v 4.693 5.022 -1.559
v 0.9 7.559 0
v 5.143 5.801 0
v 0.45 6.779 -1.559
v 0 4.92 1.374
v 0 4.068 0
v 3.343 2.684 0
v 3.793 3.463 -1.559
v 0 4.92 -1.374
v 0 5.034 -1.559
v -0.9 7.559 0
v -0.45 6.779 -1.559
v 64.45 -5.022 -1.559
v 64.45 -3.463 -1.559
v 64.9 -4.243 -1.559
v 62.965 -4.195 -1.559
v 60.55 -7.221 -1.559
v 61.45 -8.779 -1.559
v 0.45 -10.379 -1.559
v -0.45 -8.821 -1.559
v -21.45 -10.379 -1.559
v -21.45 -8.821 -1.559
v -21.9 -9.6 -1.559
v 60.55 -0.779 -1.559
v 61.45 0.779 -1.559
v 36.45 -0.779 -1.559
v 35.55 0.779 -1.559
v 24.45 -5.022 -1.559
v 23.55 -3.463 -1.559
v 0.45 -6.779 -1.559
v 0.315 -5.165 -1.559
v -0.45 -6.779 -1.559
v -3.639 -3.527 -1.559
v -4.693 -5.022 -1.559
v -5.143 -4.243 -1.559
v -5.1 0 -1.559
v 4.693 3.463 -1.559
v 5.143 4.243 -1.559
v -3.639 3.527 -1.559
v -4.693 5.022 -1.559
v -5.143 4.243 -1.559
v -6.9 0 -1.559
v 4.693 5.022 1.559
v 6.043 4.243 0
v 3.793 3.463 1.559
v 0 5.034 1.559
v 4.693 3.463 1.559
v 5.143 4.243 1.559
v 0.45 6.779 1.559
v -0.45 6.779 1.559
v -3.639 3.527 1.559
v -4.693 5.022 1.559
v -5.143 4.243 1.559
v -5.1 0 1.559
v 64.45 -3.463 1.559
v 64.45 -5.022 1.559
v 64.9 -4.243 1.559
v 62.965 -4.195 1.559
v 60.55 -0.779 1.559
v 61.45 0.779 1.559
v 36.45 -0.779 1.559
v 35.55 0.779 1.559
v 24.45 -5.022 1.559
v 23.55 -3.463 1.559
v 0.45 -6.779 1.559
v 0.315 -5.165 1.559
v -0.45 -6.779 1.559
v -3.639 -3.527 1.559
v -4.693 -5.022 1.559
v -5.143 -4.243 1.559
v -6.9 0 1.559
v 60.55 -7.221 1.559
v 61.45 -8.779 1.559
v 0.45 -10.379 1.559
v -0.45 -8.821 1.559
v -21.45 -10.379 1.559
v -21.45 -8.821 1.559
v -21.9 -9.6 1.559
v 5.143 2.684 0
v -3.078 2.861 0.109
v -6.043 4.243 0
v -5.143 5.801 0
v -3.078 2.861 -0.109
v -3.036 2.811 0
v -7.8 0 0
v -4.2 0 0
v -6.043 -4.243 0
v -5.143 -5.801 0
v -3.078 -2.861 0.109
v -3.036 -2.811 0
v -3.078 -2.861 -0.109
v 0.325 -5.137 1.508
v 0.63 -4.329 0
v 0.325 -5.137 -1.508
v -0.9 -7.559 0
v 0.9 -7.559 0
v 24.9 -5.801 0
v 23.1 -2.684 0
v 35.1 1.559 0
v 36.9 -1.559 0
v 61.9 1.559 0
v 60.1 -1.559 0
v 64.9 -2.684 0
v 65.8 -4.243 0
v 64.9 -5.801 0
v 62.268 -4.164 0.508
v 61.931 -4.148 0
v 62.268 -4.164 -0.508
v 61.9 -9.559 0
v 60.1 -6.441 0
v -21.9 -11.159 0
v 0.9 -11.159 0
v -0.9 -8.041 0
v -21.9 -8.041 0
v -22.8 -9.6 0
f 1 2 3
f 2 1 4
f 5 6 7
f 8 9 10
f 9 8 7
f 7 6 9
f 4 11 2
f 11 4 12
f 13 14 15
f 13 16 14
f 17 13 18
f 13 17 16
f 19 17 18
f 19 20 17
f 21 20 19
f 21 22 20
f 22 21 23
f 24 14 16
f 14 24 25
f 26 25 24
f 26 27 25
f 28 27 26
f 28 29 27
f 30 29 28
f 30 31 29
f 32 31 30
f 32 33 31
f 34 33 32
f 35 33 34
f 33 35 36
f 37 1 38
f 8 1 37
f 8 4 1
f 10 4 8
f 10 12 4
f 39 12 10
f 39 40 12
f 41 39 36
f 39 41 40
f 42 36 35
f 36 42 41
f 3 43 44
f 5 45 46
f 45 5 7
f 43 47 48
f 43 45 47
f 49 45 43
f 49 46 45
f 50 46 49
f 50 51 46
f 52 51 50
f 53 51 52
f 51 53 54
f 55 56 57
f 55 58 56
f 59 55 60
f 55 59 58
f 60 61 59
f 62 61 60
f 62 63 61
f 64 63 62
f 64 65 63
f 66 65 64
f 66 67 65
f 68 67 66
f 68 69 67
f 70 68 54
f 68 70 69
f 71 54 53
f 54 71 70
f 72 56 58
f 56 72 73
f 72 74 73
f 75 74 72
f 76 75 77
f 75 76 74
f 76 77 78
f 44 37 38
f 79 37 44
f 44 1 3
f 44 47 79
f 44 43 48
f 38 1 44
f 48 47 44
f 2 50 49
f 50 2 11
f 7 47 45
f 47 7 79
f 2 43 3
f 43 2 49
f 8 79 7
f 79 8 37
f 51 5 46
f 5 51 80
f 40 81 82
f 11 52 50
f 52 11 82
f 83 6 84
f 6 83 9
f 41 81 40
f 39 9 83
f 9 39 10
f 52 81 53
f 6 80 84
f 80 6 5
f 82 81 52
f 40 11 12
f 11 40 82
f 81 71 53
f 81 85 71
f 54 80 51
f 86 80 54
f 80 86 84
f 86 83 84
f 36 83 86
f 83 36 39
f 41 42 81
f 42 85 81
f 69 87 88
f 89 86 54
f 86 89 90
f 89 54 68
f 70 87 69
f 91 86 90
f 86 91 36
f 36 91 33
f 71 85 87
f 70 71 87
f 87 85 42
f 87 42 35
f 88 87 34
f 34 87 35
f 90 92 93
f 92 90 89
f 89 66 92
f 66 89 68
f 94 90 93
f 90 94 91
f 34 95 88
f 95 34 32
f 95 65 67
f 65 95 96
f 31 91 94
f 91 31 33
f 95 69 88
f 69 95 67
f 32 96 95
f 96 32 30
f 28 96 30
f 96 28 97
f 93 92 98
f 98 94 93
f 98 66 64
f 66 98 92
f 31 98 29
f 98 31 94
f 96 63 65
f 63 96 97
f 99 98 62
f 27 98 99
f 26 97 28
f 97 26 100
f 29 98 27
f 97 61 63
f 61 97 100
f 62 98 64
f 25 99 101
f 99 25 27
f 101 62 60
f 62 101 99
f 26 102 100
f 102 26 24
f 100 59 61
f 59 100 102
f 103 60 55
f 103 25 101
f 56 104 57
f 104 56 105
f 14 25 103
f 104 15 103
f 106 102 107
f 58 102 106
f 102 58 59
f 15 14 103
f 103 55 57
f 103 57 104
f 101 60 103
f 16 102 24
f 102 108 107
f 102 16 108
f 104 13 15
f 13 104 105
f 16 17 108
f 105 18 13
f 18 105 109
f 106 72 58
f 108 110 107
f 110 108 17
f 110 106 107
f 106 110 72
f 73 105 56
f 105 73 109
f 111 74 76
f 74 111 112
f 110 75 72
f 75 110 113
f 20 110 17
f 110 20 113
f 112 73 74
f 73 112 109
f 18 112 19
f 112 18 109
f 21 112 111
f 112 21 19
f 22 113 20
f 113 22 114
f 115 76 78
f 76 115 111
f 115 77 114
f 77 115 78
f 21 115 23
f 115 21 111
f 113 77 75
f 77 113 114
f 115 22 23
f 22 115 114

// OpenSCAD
// mathgrrl customizable power hair clip

////////////////////////////////////////////////////////////////////////////
// parameters //////////////////////////////////////////////////////////////

// Thickness of the path, in millimeters - make larger for sturdier clip, smaller for daintier clip
path_radius = 1.8;

// Radius of the hook loop, in millimeters
loop_radius = 6; 

// Length of the opening that captures the hair, in millimeters
capture_length = 25; 

// Height of the opening that captures the hair, in millimeters - larger for looser clip, smaller for tighter clip
capture_height = 8; 

// Length of the part that extends past the hook loop, in millimeters
end_length = 15;

////////////////////////////////////////////////////////////////////////////
// points //////////////////////////////////////////////////////////////////

points = [ 
	// points around a circle of given radius at 45 degree intervals
	[loop_radius*sqrt(2)/2,loop_radius*sqrt(2)/2,0],
	[loop_radius*0,loop_radius*1,0],
	[loop_radius*-sqrt(2)/2,loop_radius*sqrt(2)/2,0],
	[loop_radius*-1,loop_radius*0,0],
	[loop_radius*-sqrt(2)/2,loop_radius*-sqrt(2)/2,0],
	[loop_radius*0,loop_radius*-1,0],
	// move out from the loop
	[loop_radius*4,loop_radius*-sqrt(2)/2,0],
	// move up to top of capture
	[loop_radius*6,0,0],
	// move around the capture
	[loop_radius*6+capture_length,0,0],
	//[loop_radius*6.5+capture_length,0,0],
	[loop_radius*6.5+capture_length,loop_radius*-sqrt(2)/2,0],
	[loop_radius*6+capture_length,-capture_height,0],
	// move back under the loop 
	[0,loop_radius*-1-2*path_radius,0],
	// move to the endpoint
	[-loop_radius-end_length,loop_radius*-1-2*path_radius,0]
];

////////////////////////////////////////////////////////////////////////////
// render //////////////////////////////////////////////////////////////////

for(i = [0:len(points)-2]){
	hull(){
		translate(points[i]) sphere(path_radius);
		translate(points[i+1]) sphere(path_radius);
	}
}
